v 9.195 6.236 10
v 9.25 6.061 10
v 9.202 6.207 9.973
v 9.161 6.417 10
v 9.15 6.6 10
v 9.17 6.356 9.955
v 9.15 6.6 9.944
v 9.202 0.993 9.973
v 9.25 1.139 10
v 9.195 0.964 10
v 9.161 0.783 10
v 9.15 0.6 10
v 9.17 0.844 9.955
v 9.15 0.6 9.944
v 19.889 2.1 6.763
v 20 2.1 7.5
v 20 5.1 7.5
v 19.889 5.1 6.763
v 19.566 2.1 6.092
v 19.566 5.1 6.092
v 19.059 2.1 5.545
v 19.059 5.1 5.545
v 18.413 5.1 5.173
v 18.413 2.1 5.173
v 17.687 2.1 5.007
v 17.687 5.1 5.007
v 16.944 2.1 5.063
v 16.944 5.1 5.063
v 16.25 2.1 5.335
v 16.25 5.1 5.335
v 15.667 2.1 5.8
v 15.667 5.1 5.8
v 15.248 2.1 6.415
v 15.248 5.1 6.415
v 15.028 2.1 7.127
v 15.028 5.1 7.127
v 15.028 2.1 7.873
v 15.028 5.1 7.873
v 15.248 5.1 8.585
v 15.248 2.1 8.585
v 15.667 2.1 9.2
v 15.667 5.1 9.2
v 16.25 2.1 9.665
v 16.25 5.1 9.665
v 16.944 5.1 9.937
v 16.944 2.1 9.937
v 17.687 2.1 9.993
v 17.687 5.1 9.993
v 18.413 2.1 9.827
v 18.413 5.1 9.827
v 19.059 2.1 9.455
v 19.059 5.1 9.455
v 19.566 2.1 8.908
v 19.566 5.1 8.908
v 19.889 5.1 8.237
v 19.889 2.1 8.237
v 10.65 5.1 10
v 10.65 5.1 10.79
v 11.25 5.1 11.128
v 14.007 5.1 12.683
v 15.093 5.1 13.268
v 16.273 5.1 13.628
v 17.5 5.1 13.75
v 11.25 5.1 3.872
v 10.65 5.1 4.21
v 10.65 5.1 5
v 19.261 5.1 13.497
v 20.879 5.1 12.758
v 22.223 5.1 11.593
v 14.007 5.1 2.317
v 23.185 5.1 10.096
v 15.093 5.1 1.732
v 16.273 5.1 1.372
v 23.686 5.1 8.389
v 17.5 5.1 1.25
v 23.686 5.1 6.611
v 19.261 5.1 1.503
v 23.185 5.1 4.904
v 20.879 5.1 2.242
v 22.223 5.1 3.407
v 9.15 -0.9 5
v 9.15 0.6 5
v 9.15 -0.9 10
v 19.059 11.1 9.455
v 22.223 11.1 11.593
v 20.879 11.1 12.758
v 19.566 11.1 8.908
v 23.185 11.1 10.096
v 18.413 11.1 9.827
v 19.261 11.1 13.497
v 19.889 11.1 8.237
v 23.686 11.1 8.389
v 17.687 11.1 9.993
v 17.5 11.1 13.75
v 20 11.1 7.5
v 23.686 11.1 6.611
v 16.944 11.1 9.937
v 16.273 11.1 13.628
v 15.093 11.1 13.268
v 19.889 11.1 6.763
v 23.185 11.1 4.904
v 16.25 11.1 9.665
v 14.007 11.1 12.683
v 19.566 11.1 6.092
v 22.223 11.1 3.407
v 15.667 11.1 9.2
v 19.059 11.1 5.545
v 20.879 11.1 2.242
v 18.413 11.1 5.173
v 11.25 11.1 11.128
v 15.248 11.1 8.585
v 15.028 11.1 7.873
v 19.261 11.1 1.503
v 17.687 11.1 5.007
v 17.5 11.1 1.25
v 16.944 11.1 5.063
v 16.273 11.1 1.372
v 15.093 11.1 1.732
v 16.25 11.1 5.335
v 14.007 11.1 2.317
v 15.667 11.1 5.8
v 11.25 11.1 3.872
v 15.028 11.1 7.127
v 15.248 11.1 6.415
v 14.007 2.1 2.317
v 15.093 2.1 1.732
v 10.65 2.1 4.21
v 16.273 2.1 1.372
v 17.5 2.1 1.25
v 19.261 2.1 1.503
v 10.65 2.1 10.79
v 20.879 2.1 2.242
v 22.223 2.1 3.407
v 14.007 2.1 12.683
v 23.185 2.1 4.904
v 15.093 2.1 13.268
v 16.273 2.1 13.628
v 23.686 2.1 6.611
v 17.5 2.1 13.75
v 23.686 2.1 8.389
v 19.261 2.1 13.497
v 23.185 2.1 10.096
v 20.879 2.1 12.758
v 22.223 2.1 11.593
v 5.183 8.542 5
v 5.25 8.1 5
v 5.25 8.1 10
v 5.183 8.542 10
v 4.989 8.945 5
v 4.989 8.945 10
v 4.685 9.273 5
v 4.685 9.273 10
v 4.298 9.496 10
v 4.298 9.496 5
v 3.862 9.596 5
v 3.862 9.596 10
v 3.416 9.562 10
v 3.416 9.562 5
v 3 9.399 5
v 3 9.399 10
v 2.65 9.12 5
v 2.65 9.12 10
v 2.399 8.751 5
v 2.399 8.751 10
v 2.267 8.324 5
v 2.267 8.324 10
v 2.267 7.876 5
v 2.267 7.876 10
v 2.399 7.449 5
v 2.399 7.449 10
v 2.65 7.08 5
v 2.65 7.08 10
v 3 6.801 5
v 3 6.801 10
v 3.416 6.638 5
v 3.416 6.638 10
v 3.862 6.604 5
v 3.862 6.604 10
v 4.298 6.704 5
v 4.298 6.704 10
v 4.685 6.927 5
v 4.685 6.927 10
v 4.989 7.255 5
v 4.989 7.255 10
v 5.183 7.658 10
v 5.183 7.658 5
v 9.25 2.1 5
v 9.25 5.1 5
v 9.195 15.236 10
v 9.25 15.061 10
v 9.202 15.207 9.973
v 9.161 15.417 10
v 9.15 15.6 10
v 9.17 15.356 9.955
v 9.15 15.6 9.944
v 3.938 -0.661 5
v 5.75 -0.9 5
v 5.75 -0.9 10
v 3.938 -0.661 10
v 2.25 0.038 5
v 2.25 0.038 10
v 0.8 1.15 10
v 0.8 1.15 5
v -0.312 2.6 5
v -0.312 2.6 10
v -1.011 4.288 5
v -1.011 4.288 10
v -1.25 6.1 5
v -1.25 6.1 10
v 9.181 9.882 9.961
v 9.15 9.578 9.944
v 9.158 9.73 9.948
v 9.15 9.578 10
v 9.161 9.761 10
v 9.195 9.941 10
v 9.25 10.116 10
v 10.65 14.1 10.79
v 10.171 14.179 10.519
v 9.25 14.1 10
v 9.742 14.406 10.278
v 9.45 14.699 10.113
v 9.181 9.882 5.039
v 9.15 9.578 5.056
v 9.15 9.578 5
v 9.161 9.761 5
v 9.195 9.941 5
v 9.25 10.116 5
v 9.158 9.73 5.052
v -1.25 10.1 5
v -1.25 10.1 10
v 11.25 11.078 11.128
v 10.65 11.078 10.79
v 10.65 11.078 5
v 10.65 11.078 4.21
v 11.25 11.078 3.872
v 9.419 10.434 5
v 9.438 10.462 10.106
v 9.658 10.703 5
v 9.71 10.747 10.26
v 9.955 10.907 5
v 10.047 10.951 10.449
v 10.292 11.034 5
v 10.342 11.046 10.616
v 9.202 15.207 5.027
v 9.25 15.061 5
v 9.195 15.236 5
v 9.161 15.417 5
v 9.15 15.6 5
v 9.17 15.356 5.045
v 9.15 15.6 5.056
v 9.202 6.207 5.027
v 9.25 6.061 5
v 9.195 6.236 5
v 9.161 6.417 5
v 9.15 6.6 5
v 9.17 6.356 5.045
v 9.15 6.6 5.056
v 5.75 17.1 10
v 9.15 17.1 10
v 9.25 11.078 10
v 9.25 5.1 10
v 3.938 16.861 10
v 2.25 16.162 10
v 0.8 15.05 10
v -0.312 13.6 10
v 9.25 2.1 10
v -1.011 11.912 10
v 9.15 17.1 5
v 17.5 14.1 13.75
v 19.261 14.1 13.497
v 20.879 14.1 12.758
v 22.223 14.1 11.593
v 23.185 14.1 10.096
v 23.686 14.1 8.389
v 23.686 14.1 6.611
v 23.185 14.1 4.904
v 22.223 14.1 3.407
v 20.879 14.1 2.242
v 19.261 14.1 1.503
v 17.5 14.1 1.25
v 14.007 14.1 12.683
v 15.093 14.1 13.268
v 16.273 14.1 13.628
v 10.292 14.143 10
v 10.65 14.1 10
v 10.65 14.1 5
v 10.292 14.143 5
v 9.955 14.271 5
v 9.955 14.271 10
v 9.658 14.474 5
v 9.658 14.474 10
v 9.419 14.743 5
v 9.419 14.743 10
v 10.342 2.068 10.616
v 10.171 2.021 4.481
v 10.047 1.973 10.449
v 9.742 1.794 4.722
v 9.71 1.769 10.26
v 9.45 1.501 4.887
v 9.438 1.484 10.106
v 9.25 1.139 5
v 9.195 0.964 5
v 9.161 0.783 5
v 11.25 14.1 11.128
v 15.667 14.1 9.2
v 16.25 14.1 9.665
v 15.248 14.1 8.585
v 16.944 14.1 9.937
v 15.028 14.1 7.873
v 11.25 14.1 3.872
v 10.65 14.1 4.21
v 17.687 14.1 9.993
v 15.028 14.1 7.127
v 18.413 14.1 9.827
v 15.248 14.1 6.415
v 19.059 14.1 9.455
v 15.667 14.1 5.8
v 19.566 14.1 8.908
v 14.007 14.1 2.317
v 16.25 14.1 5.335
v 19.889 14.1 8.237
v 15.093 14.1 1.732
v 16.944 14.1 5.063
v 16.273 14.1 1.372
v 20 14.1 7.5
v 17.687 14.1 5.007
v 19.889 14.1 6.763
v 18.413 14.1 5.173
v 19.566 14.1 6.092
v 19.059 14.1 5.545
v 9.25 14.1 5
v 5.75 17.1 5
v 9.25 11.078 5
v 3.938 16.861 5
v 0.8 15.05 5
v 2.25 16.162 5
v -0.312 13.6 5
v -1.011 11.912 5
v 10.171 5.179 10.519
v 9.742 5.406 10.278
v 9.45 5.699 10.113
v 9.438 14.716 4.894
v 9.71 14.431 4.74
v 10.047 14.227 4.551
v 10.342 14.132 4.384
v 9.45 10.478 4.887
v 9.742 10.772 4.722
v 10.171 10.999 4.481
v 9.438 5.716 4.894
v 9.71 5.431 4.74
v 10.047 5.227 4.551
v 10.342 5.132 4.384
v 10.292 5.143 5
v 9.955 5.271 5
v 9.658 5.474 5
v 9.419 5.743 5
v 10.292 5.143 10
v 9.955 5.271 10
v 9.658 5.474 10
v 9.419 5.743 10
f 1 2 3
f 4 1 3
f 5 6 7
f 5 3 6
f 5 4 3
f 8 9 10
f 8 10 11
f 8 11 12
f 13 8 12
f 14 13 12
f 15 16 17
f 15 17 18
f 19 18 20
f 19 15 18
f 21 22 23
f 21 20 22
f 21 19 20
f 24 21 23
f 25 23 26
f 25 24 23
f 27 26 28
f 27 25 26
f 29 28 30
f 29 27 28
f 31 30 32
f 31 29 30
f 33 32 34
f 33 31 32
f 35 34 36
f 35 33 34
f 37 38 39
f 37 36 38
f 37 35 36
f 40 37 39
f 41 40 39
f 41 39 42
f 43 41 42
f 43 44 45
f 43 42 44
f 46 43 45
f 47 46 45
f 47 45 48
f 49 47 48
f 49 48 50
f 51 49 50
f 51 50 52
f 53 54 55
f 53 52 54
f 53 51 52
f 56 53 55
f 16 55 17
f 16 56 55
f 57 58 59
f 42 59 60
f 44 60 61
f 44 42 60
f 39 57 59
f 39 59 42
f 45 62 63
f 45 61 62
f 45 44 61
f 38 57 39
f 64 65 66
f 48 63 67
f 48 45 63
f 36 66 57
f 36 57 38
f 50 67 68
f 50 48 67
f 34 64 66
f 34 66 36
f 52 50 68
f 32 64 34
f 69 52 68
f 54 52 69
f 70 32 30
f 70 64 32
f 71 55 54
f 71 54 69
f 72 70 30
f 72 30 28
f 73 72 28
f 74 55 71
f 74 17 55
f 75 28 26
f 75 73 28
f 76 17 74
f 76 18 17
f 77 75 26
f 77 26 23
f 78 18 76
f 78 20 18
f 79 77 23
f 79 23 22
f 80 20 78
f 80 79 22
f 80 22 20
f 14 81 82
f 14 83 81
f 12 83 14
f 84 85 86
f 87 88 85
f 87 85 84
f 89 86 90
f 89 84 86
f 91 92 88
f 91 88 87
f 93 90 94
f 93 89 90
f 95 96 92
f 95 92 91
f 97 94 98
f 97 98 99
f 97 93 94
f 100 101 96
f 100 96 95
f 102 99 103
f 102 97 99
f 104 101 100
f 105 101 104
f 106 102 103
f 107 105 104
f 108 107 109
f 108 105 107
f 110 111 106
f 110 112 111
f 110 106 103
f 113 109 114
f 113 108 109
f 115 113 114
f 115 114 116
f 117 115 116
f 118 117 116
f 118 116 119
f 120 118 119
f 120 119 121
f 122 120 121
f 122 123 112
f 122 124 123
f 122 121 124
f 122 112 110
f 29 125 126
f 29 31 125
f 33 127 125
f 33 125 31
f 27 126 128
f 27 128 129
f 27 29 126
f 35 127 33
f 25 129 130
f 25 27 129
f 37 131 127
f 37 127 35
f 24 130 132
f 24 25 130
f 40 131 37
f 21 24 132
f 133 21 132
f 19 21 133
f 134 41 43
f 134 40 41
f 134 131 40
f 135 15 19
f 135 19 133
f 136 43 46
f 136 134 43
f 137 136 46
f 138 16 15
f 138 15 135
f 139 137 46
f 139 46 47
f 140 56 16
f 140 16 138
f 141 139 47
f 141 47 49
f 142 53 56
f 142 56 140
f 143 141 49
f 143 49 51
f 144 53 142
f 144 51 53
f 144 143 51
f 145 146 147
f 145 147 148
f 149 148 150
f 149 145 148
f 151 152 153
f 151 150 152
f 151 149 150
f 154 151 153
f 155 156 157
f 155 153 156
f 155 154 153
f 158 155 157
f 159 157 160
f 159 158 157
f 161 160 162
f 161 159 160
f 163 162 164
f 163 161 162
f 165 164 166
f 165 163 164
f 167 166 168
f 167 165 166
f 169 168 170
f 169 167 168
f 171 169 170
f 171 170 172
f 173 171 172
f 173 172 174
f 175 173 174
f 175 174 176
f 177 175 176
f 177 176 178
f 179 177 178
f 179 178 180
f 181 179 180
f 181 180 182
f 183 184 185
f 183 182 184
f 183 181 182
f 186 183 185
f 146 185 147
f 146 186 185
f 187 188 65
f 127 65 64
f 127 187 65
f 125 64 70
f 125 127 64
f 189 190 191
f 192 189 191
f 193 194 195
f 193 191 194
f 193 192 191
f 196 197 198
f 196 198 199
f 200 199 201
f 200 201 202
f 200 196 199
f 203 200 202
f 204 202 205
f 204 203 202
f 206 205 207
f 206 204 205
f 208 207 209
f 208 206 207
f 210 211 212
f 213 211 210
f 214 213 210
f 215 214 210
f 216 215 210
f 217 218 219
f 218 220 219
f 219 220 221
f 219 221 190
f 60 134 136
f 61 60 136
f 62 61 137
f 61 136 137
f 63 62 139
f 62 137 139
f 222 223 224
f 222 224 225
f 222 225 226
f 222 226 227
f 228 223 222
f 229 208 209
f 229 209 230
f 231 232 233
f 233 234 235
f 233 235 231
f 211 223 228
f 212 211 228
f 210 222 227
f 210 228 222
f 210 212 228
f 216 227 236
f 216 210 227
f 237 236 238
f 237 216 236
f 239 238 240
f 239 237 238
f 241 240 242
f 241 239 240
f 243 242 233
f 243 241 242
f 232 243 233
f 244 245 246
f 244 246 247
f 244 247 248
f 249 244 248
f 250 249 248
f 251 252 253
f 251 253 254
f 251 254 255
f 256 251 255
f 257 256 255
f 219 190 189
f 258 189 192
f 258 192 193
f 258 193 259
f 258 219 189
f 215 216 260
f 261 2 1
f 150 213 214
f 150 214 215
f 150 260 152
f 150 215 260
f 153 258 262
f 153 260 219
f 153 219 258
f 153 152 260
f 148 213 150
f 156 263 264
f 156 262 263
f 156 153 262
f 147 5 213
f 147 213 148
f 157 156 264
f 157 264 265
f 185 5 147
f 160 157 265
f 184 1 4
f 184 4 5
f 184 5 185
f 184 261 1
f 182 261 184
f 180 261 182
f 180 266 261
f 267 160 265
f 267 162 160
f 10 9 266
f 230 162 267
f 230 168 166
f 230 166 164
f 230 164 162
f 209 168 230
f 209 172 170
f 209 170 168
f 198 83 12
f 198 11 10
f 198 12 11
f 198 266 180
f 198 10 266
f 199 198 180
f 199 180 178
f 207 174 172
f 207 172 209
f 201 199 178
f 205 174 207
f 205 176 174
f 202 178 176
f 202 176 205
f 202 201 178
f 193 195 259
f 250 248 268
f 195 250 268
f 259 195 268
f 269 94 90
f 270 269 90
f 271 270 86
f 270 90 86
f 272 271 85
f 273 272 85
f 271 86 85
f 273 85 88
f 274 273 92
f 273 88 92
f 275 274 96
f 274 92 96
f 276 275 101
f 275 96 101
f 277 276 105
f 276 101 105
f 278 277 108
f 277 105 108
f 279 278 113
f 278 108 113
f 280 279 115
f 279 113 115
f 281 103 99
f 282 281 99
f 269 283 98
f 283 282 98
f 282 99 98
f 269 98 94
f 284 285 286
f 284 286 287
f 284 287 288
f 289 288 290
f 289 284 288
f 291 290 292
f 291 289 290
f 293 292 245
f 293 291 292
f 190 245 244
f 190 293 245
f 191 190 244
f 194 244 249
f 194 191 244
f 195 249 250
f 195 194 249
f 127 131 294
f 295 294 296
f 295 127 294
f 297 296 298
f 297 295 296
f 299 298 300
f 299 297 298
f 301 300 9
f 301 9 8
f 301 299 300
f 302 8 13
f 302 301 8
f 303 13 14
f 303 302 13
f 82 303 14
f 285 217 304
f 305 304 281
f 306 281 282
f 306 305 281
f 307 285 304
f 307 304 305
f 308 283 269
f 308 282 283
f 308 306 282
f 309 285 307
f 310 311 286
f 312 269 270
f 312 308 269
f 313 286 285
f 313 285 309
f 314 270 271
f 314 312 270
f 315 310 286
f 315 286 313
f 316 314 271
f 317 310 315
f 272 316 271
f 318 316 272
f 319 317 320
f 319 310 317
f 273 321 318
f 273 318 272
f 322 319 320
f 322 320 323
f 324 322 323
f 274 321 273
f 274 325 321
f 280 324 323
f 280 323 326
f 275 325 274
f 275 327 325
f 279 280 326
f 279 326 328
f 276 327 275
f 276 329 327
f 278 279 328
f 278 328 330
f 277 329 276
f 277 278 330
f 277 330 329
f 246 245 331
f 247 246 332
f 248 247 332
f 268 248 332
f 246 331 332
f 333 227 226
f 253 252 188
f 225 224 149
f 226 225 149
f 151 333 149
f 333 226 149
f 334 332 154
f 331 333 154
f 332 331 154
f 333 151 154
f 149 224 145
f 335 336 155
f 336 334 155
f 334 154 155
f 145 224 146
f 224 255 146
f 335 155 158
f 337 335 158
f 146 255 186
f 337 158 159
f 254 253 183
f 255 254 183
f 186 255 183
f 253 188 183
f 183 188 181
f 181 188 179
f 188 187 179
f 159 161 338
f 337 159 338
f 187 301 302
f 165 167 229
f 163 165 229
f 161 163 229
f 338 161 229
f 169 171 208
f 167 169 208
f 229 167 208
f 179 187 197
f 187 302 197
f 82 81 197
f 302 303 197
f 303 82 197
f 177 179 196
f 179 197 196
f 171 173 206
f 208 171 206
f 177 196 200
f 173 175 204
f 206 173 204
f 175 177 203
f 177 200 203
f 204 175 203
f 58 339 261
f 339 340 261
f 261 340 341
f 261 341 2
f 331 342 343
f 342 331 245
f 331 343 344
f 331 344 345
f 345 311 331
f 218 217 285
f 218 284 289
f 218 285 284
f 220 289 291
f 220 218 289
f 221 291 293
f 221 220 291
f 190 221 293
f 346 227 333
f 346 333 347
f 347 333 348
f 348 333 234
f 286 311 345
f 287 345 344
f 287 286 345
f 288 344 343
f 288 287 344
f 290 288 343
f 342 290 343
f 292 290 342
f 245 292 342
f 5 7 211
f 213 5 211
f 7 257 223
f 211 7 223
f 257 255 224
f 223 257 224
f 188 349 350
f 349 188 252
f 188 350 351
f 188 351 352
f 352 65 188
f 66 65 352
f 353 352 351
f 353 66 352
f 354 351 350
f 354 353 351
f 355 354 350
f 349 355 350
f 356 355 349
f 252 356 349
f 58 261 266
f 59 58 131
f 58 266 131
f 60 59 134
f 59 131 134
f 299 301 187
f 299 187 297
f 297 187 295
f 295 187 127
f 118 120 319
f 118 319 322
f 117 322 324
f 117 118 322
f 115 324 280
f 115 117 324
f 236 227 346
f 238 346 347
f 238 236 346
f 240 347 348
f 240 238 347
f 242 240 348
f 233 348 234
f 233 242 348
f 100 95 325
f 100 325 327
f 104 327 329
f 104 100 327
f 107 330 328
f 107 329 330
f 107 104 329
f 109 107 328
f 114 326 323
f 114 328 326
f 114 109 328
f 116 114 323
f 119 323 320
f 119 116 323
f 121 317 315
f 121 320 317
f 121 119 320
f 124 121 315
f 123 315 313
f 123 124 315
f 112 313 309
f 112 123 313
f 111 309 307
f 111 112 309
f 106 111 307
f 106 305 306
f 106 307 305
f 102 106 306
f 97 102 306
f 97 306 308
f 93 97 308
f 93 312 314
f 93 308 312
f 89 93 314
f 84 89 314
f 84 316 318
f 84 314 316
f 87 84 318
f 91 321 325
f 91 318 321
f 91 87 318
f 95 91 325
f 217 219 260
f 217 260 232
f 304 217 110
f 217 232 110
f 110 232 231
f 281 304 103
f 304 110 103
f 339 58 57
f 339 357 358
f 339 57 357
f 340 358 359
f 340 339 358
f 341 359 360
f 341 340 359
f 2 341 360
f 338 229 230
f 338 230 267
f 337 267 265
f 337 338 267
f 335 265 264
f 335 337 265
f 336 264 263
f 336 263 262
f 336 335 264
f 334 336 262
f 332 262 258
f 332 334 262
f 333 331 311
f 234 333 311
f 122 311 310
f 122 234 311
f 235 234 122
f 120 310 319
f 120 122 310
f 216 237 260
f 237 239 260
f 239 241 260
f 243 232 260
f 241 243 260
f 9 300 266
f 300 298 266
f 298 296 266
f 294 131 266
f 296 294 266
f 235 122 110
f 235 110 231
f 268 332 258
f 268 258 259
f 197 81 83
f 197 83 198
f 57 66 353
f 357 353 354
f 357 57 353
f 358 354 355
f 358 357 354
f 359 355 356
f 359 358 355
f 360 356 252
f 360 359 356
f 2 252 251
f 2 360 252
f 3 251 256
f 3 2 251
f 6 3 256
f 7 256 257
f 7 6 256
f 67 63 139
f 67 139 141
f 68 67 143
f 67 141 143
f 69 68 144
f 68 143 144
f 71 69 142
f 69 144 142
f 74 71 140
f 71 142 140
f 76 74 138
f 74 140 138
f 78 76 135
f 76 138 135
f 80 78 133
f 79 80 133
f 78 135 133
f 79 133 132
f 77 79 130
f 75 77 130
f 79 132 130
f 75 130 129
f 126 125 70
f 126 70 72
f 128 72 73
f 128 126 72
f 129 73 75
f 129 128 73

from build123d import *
from build123d.topology import SkipClean

# Parameters (mm, degrees)
CROQUIS1_R              = 1.5
SALIENTE_EXTRUIR1_DEPTH = 15
CROQUIS2_R              = 2.5
CORTAR_EXTRUIR1_DEPTH   = 20
CORTAR_EXTRUIR2_START   = -26
CORTAR_EXTRUIR2_DEPTH   = 26
CROQUIS5_W              = 3.971897385
CROQUIS5_H              = 3.395681121
CROQUIS5_W_2            = 4.283880282
CROQUIS5_H_2            = 5.977747231
CROQUIS5_W_3            = 4.50146752
CROQUIS5_H_3            = 3.991827506
CORTAR_EXTRUIR5_DEPTH   = 10
REDONDEO1_R             = 1.5


with BuildPart() as part:
    # Croquis1 → Saliente-Extruir1 (new body)
    with BuildSketch(Plane.XY):
        with BuildLine():
            Line((11.25, 17.1), (11.25, 14.1))
            Line((11.25, 14.1), (23.75, 14.1))
            Line((23.75, 14.1), (23.75, 11.1))
            Line((23.75, 11.1), (11.25, 11.1))
            Line((11.25, 11.1), (11.25, 5.1))
            Line((11.25, 5.1), (23.75, 5.1))
            Line((23.75, 5.1), (23.75, 2.1))
            Line((23.75, 2.1), (11.25, 2.1))
            Line((11.25, 2.1), (11.25, -0.9))
            Line((11.25, -0.9), (5.75, -0.9))
            ThreePointArc((5.75, -0.9), (0.800252532, 1.150252532), (-1.25, 6.1))
            Line((-1.25, 6.1), (-1.25, 10.1))
            ThreePointArc((-1.25, 10.1), (0.800252532, 15.049747468), (5.75, 17.1))
            Line((5.75, 17.1), (11.25, 17.1))
        make_face()
        with Locations((3.75, 8.1)):
            Circle(CROQUIS1_R, mode=Mode.SUBTRACT)
    extrude(amount=SALIENTE_EXTRUIR1_DEPTH)

    # Croquis2 → Cortar-Extruir1 (cut)
    with BuildSketch(Plane(origin=(0, 0, 0), x_dir=(1, 0, 0), z_dir=(0, 1, 0))):
        with Locations((17.5, -7.5)):
            Circle(CROQUIS2_R)
        with BuildLine():
            Line((17.5, -1.25), (11.25, 0))
            Line((11.25, 0), (11.126279301, 1.868603497))
            Line((11.126279301, 1.868603497), (29.663453957, 1.868603497))
            Line((29.663453957, 1.868603497), (29.663453957, -17.961269996))
            Line((29.663453957, -17.961269996), (11.25, -17.961269996))
            Line((11.25, -17.961269996), (11.25, -15))
            Line((11.25, -15), (17.5, -13.75))
            ThreePointArc((17.5, -13.75), (23.75, -7.5), (17.5, -1.25))
        make_face()
    extrude(amount=CORTAR_EXTRUIR1_DEPTH, mode=Mode.SUBTRACT)

    # Croquis4 → Cortar-Extruir2 (cut)
    with SkipClean():  # the faces are left unmerged after this step: merging them gives an invalid solid
        with BuildSketch(Plane(origin=(0, 17.1, 0), x_dir=(1, 0, 0), z_dir=(0, 1, 0)).offset(CORTAR_EXTRUIR2_START)):
            with BuildLine():
                Line((-4.389645589, -10), (9.25, -10))
                Line((9.25, -10), (14.007302121, -12.683006997))
                ThreePointArc((14.007302121, -12.683006997), (15.673978879, -13.477302641), (17.5, -13.75))
                Line((17.5, -13.75), (17.5, -16.45653889))
                Line((17.5, -16.45653889), (-4.389645589, -16.45653889))
                Line((-4.389645589, -16.45653889), (-4.389645589, -10))
            make_face()
            with BuildLine():
                Line((9.25, -5), (14.007302121, -2.316993003))
                ThreePointArc((14.007302121, -2.316993003), (15.673978879, -1.522697359), (17.5, -1.25))
                Line((17.5, -1.25), (17.5, 1.887707064))
                Line((17.5, 1.887707064), (-4.389645589, 1.887707064))
                Line((-4.389645589, 1.887707064), (-4.389645589, -5))
                Line((-4.389645589, -5), (9.25, -5))
            make_face()
        extrude(amount=CORTAR_EXTRUIR2_DEPTH, mode=Mode.SUBTRACT)

    # Croquis5 → Cortar-Extruir5 (cut, symmetric)
    with SkipClean():  # the faces are left unmerged after this step: merging them gives an invalid solid
        with BuildSketch(Plane.XY.offset(10)):
            with Locations((11.135948693, 15.797840561)):
                Rectangle(CROQUIS5_W, CROQUIS5_H)
            with Locations((11.291940141, 8.088873616)):
                Rectangle(CROQUIS5_W_2, CROQUIS5_H_2)
            with Locations((11.40073376, 0.104086247)):
                Rectangle(CROQUIS5_W_3, CROQUIS5_H_3)
        extrude(amount=CORTAR_EXTRUIR5_DEPTH, both=True, mode=Mode.SUBTRACT)

    # Redondeo1
    # the kernel refuses this fillet: 1.5 mm, written as the material it adds along each edge
    with BuildSketch(Plane(origin=(9.15, 2.1, 1.25), x_dir=(0, -1, 0), z_dir=(0, 0, 1))) as redondeo1_piece_1_section:
        with BuildLine():
            CenterArc((REDONDEO1_R, REDONDEO1_R), REDONDEO1_R, 180, 90)
            Line((0, REDONDEO1_R), (0, 0))
            Line((0, 0), (REDONDEO1_R, 0))
        make_face()
    redondeo1_piece_1 = extrude(amount=8.75, mode=Mode.PRIVATE)
    redondeo1_piece_1 = split(redondeo1_piece_1, bisect_by=Plane(origin=(9.866987005, 1.973706672, 5), z_dir=(0, 0, -1)), keep=Keep.TOP, mode=Mode.PRIVATE)
    redondeo1_piece_1 = split(redondeo1_piece_1, bisect_by=Plane(origin=(9.792542983, 1.973706672, 4.694018462), z_dir=(0.4912379413342998, 0, 0.8710254215541813)), keep=Keep.TOP, mode=Mode.PRIVATE)
    add(redondeo1_piece_1)
    with BuildSketch(Plane(origin=(9.15, 2.1, 5), x_dir=(0, -1, 0), z_dir=(0, 0, 1))) as redondeo1_piece_2_section:
        with BuildLine():
            CenterArc((REDONDEO1_R, REDONDEO1_R), REDONDEO1_R, 180, 90)
            Line((0, REDONDEO1_R), (0, 0))
            Line((0, 0), (REDONDEO1_R, 0))
        make_face()
    redondeo1_piece_2 = extrude(amount=5, mode=Mode.PRIVATE)
    redondeo1_piece_2 = split(redondeo1_piece_2, bisect_by=Plane(origin=(9.170520701, 1.440228568, 5.044824463), z_dir=(-0.4912379413342998, 0, -0.8710254215541813)), keep=Keep.TOP, mode=Mode.PRIVATE)
    add(redondeo1_piece_2)
    with BuildSketch(Plane(origin=(9.15, 2.1, 5), x_dir=(0, -1, 0), z_dir=(0, 0, 1))) as redondeo1_piece_3_section:
        with BuildLine():
            CenterArc((REDONDEO1_R, REDONDEO1_R), REDONDEO1_R, 180, 90)
            Line((0, REDONDEO1_R), (0, 0))
            Line((0, 0), (REDONDEO1_R, 0))
        make_face()
    redondeo1_piece_3 = extrude(amount=5, mode=Mode.PRIVATE)
    redondeo1_piece_3 = split(redondeo1_piece_3, bisect_by=Plane(origin=(8.363208573, 1.761858884, 5.500129599), z_dir=(0.4912379413342998, 0, 0.8710254215541813)), keep=Keep.TOP, mode=Mode.PRIVATE)
    redondeo1_piece_3 = split(redondeo1_piece_3, bisect_by=Plane(origin=(8.363208573, 1.761858884, 9.499870401), z_dir=(0.4912379413342999, 0, -0.8710254215541812)), keep=Keep.TOP, mode=Mode.PRIVATE)
    add(redondeo1_piece_3)
    with BuildSketch(Plane(origin=(9.15, 2.1, 5), x_dir=(0, -1, 0), z_dir=(0, 0, 1))) as redondeo1_piece_4_section:
        with BuildLine():
            CenterArc((REDONDEO1_R, REDONDEO1_R), REDONDEO1_R, 180, 90)
            Line((0, REDONDEO1_R), (0, 0))
            Line((0, 0), (REDONDEO1_R, 0))
        make_face()
    redondeo1_piece_4 = extrude(amount=8.75, mode=Mode.PRIVATE)
    redondeo1_piece_4 = split(redondeo1_piece_4, bisect_by=Plane(origin=(9.866987005, 1.973706672, 10), z_dir=(0, 0, 1)), keep=Keep.TOP, mode=Mode.PRIVATE)
    redondeo1_piece_4 = split(redondeo1_piece_4, bisect_by=Plane(origin=(9.792542983, 1.973706672, 10.305981538), z_dir=(0.4912379413342999, 0, -0.8710254215541812)), keep=Keep.TOP, mode=Mode.PRIVATE)
    add(redondeo1_piece_4)
    with BuildSketch(Plane(origin=(9.15, 2.1, 5), x_dir=(0, -1, 0), z_dir=(0, 0, 1))) as redondeo1_piece_5_section:
        with BuildLine():
            CenterArc((REDONDEO1_R, REDONDEO1_R), REDONDEO1_R, 180, 90)
            Line((0, REDONDEO1_R), (0, 0))
            Line((0, 0), (REDONDEO1_R, 0))
        make_face()
    redondeo1_piece_5 = extrude(amount=5, mode=Mode.PRIVATE)
    redondeo1_piece_5 = split(redondeo1_piece_5, bisect_by=Plane(origin=(9.170520701, 1.440228568, 9.955175537), z_dir=(-0.4912379413342999, 0, 0.8710254215541812)), keep=Keep.TOP, mode=Mode.PRIVATE)
    add(redondeo1_piece_5)
    with BuildSketch(Plane(origin=(9.15, 5.1, 10), x_dir=(1, 0, 0), z_dir=(0, 0, -1))) as redondeo1_piece_6_section:
        with BuildLine():
            CenterArc((REDONDEO1_R, -REDONDEO1_R), REDONDEO1_R, 90, 90)
            Line((0, -REDONDEO1_R), (0, 0))
            Line((0, 0), (REDONDEO1_R, 0))
        make_face()
    redondeo1_piece_6 = extrude(amount=5, mode=Mode.PRIVATE)
    redondeo1_piece_6 = split(redondeo1_piece_6, bisect_by=Plane(origin=(9.170520704, 5.759771469, 9.955175538), z_dir=(-0.4912379413342999, 0, 0.8710254215541812)), keep=Keep.TOP, mode=Mode.PRIVATE)
    add(redondeo1_piece_6)
    with BuildSketch(Plane(origin=(9.15, 5.1, 13.75), x_dir=(1, 0, 0), z_dir=(0, 0, -1))) as redondeo1_piece_7_section:
        with BuildLine():
            CenterArc((REDONDEO1_R, -REDONDEO1_R), REDONDEO1_R, 90, 90)
            Line((0, -REDONDEO1_R), (0, 0))
            Line((0, 0), (REDONDEO1_R, 0))
        make_face()
    redondeo1_piece_7 = extrude(amount=8.75, mode=Mode.PRIVATE)
    redondeo1_piece_7 = split(redondeo1_piece_7, bisect_by=Plane(origin=(9.866987013, 5.226293308, 10), z_dir=(0, 0, 1)), keep=Keep.TOP, mode=Mode.PRIVATE)
    redondeo1_piece_7 = split(redondeo1_piece_7, bisect_by=Plane(origin=(9.792542992, 5.226293308, 10.305981543), z_dir=(0.4912379413342999, 0, -0.8710254215541812)), keep=Keep.TOP, mode=Mode.PRIVATE)
    add(redondeo1_piece_7)
    with BuildSketch(Plane(origin=(9.15, 5.1, 10), x_dir=(1, 0, 0), z_dir=(0, 0, -1))) as redondeo1_piece_8_section:
        with BuildLine():
            CenterArc((REDONDEO1_R, -REDONDEO1_R), REDONDEO1_R, 90, 90)
            Line((0, -REDONDEO1_R), (0, 0))
            Line((0, 0), (REDONDEO1_R, 0))
        make_face()
    redondeo1_piece_8 = extrude(amount=5, mode=Mode.PRIVATE)
    redondeo1_piece_8 = split(redondeo1_piece_8, bisect_by=Plane(origin=(8.363208574, 5.438141117, 5.500129598), z_dir=(0.4912379413342998, 0, 0.8710254215541813)), keep=Keep.TOP, mode=Mode.PRIVATE)
    redondeo1_piece_8 = split(redondeo1_piece_8, bisect_by=Plane(origin=(8.363208574, 5.438141117, 9.499870402), z_dir=(0.4912379413342999, 0, -0.8710254215541812)), keep=Keep.TOP, mode=Mode.PRIVATE)
    add(redondeo1_piece_8)
    with BuildSketch(Plane(origin=(9.15, 5.1, 10), x_dir=(1, 0, 0), z_dir=(0, 0, -1))) as redondeo1_piece_9_section:
        with BuildLine():
            CenterArc((REDONDEO1_R, -REDONDEO1_R), REDONDEO1_R, 90, 90)
            Line((0, -REDONDEO1_R), (0, 0))
            Line((0, 0), (REDONDEO1_R, 0))
        make_face()
    redondeo1_piece_9 = extrude(amount=5, mode=Mode.PRIVATE)
    redondeo1_piece_9 = split(redondeo1_piece_9, bisect_by=Plane(origin=(9.170520704, 5.759771469, 5.044824462), z_dir=(-0.4912379413342998, 0, -0.8710254215541813)), keep=Keep.TOP, mode=Mode.PRIVATE)
    add(redondeo1_piece_9)
    with BuildSketch(Plane(origin=(9.15, 5.1, 10), x_dir=(1, 0, 0), z_dir=(0, 0, -1))) as redondeo1_piece_10_section:
        with BuildLine():
            CenterArc((REDONDEO1_R, -REDONDEO1_R), REDONDEO1_R, 90, 90)
            Line((0, -REDONDEO1_R), (0, 0))
            Line((0, 0), (REDONDEO1_R, 0))
        make_face()
    redondeo1_piece_10 = extrude(amount=8.75, mode=Mode.PRIVATE)
    redondeo1_piece_10 = split(redondeo1_piece_10, bisect_by=Plane(origin=(9.866987013, 5.226293308, 5), z_dir=(0, 0, -1)), keep=Keep.TOP, mode=Mode.PRIVATE)
    redondeo1_piece_10 = split(redondeo1_piece_10, bisect_by=Plane(origin=(9.792542992, 5.226293308, 4.694018457), z_dir=(0.4912379413342998, 0, 0.8710254215541813)), keep=Keep.TOP, mode=Mode.PRIVATE)
    add(redondeo1_piece_10)
    with BuildSketch(Plane(origin=(9.15, 11.077747231, 13.75), x_dir=(0, -1, 0), z_dir=(0, 0, -1))) as redondeo1_piece_11_section:
        with BuildLine():
            CenterArc((REDONDEO1_R, -REDONDEO1_R), REDONDEO1_R, 90, 90)
            Line((0, -REDONDEO1_R), (0, 0))
            Line((0, 0), (REDONDEO1_R, 0))
        make_face()
    redondeo1_piece_11 = extrude(amount=8.75, mode=Mode.PRIVATE)
    redondeo1_piece_11 = split(redondeo1_piece_11, bisect_by=Plane(origin=(9.866987005, 10.951453903, 10), z_dir=(0, 0, 1)), keep=Keep.TOP, mode=Mode.PRIVATE)
    redondeo1_piece_11 = split(redondeo1_piece_11, bisect_by=Plane(origin=(9.792542983, 10.951453903, 10.305981538), z_dir=(0.4912379413342999, 0, -0.8710254215541812)), keep=Keep.TOP, mode=Mode.PRIVATE)
    add(redondeo1_piece_11)
    with BuildSketch(Plane(origin=(9.15, 11.077747231, 10), x_dir=(0, -1, 0), z_dir=(0, 0, -1))) as redondeo1_piece_12_section:
        with BuildLine():
            CenterArc((REDONDEO1_R, -REDONDEO1_R), REDONDEO1_R, 90, 90)
            Line((0, -REDONDEO1_R), (0, 0))
            Line((0, 0), (REDONDEO1_R, 0))
        make_face()
    redondeo1_piece_12 = extrude(amount=5, mode=Mode.PRIVATE)
    redondeo1_piece_12 = split(redondeo1_piece_12, bisect_by=Plane(origin=(9.170520701, 10.417975799, 9.955175537), z_dir=(-0.4912379413342999, 0, 0.8710254215541812)), keep=Keep.TOP, mode=Mode.PRIVATE)
    add(redondeo1_piece_12)
    with BuildSketch(Plane(origin=(9.15, 11.077747231, 10), x_dir=(0, -1, 0), z_dir=(0, 0, -1))) as redondeo1_piece_13_section:
        with BuildLine():
            CenterArc((REDONDEO1_R, -REDONDEO1_R), REDONDEO1_R, 90, 90)
            Line((0, -REDONDEO1_R), (0, 0))
            Line((0, 0), (REDONDEO1_R, 0))
        make_face()
    redondeo1_piece_13 = extrude(amount=5, mode=Mode.PRIVATE)
    redondeo1_piece_13 = split(redondeo1_piece_13, bisect_by=Plane(origin=(8.363208573, 10.739606115, 9.499870401), z_dir=(0.4912379413342999, 0, -0.8710254215541812)), keep=Keep.TOP, mode=Mode.PRIVATE)
    redondeo1_piece_13 = split(redondeo1_piece_13, bisect_by=Plane(origin=(8.363208573, 10.739606115, 5.500129599), z_dir=(0.4912379413342998, 0, 0.8710254215541813)), keep=Keep.TOP, mode=Mode.PRIVATE)
    add(redondeo1_piece_13)
    with BuildSketch(Plane(origin=(9.15, 11.077747231, 10), x_dir=(0, -1, 0), z_dir=(0, 0, -1))) as redondeo1_piece_14_section:
        with BuildLine():
            CenterArc((REDONDEO1_R, -REDONDEO1_R), REDONDEO1_R, 90, 90)
            Line((0, -REDONDEO1_R), (0, 0))
            Line((0, 0), (REDONDEO1_R, 0))
        make_face()
    redondeo1_piece_14 = extrude(amount=8.75, mode=Mode.PRIVATE)
    redondeo1_piece_14 = split(redondeo1_piece_14, bisect_by=Plane(origin=(9.866987005, 10.951453903, 5), z_dir=(0, 0, -1)), keep=Keep.TOP, mode=Mode.PRIVATE)
    redondeo1_piece_14 = split(redondeo1_piece_14, bisect_by=Plane(origin=(9.792542983, 10.951453903, 4.694018462), z_dir=(0.4912379413342998, 0, 0.8710254215541813)), keep=Keep.TOP, mode=Mode.PRIVATE)
    add(redondeo1_piece_14)
    with BuildSketch(Plane(origin=(9.15, 11.077747231, 10), x_dir=(0, -1, 0), z_dir=(0, 0, -1))) as redondeo1_piece_15_section:
        with BuildLine():
            CenterArc((REDONDEO1_R, -REDONDEO1_R), REDONDEO1_R, 90, 90)
            Line((0, -REDONDEO1_R), (0, 0))
            Line((0, 0), (REDONDEO1_R, 0))
        make_face()
    redondeo1_piece_15 = extrude(amount=5, mode=Mode.PRIVATE)
    redondeo1_piece_15 = split(redondeo1_piece_15, bisect_by=Plane(origin=(9.170520701, 10.417975799, 5.044824463), z_dir=(-0.4912379413342998, 0, -0.8710254215541813)), keep=Keep.TOP, mode=Mode.PRIVATE)
    add(redondeo1_piece_15)
    with BuildSketch(Plane(origin=(9.15, 14.1, 10), x_dir=(1, 0, 0), z_dir=(0, 0, -1))) as redondeo1_piece_16_section:
        with BuildLine():
            CenterArc((REDONDEO1_R, -REDONDEO1_R), REDONDEO1_R, 90, 90)
            Line((0, -REDONDEO1_R), (0, 0))
            Line((0, 0), (REDONDEO1_R, 0))
        make_face()
    redondeo1_piece_16 = extrude(amount=5, mode=Mode.PRIVATE)
    redondeo1_piece_16 = split(redondeo1_piece_16, bisect_by=Plane(origin=(9.170520704, 14.759771469, 9.955175538), z_dir=(-0.4912379413342999, 0, 0.8710254215541812)), keep=Keep.TOP, mode=Mode.PRIVATE)
    add(redondeo1_piece_16)
    with BuildSketch(Plane(origin=(9.15, 14.1, 13.75), x_dir=(1, 0, 0), z_dir=(0, 0, -1))) as redondeo1_piece_17_section:
        with BuildLine():
            CenterArc((REDONDEO1_R, -REDONDEO1_R), REDONDEO1_R, 90, 90)
            Line((0, -REDONDEO1_R), (0, 0))
            Line((0, 0), (REDONDEO1_R, 0))
        make_face()
    redondeo1_piece_17 = extrude(amount=8.75, mode=Mode.PRIVATE)
    redondeo1_piece_17 = split(redondeo1_piece_17, bisect_by=Plane(origin=(9.866987013, 14.226293308, 10), z_dir=(0, 0, 1)), keep=Keep.TOP, mode=Mode.PRIVATE)
    redondeo1_piece_17 = split(redondeo1_piece_17, bisect_by=Plane(origin=(9.792542992, 14.226293308, 10.305981543), z_dir=(0.4912379413342999, 0, -0.8710254215541812)), keep=Keep.TOP, mode=Mode.PRIVATE)
    add(redondeo1_piece_17)
    with BuildSketch(Plane(origin=(9.15, 14.1, 10), x_dir=(1, 0, 0), z_dir=(0, 0, -1))) as redondeo1_piece_18_section:
        with BuildLine():
            CenterArc((REDONDEO1_R, -REDONDEO1_R), REDONDEO1_R, 90, 90)
            Line((0, -REDONDEO1_R), (0, 0))
            Line((0, 0), (REDONDEO1_R, 0))
        make_face()
    redondeo1_piece_18 = extrude(amount=5, mode=Mode.PRIVATE)
    redondeo1_piece_18 = split(redondeo1_piece_18, bisect_by=Plane(origin=(8.363208574, 14.438141117, 5.500129598), z_dir=(0.4912379413342998, 0, 0.8710254215541813)), keep=Keep.TOP, mode=Mode.PRIVATE)
    redondeo1_piece_18 = split(redondeo1_piece_18, bisect_by=Plane(origin=(8.363208574, 14.438141117, 9.499870402), z_dir=(0.4912379413342999, 0, -0.8710254215541812)), keep=Keep.TOP, mode=Mode.PRIVATE)
    add(redondeo1_piece_18)
    with BuildSketch(Plane(origin=(9.15, 14.1, 10), x_dir=(1, 0, 0), z_dir=(0, 0, -1))) as redondeo1_piece_19_section:
        with BuildLine():
            CenterArc((REDONDEO1_R, -REDONDEO1_R), REDONDEO1_R, 90, 90)
            Line((0, -REDONDEO1_R), (0, 0))
            Line((0, 0), (REDONDEO1_R, 0))
        make_face()
    redondeo1_piece_19 = extrude(amount=5, mode=Mode.PRIVATE)
    redondeo1_piece_19 = split(redondeo1_piece_19, bisect_by=Plane(origin=(9.170520704, 14.759771469, 5.044824462), z_dir=(-0.4912379413342998, 0, -0.8710254215541813)), keep=Keep.TOP, mode=Mode.PRIVATE)
    add(redondeo1_piece_19)
    with BuildSketch(Plane(origin=(9.15, 14.1, 10), x_dir=(1, 0, 0), z_dir=(0, 0, -1))) as redondeo1_piece_20_section:
        with BuildLine():
            CenterArc((REDONDEO1_R, -REDONDEO1_R), REDONDEO1_R, 90, 90)
            Line((0, -REDONDEO1_R), (0, 0))
            Line((0, 0), (REDONDEO1_R, 0))
        make_face()
    redondeo1_piece_20 = extrude(amount=8.75, mode=Mode.PRIVATE)
    redondeo1_piece_20 = split(redondeo1_piece_20, bisect_by=Plane(origin=(9.866987013, 14.226293308, 5), z_dir=(0, 0, -1)), keep=Keep.TOP, mode=Mode.PRIVATE)
    redondeo1_piece_20 = split(redondeo1_piece_20, bisect_by=Plane(origin=(9.792542992, 14.226293308, 4.694018457), z_dir=(0.4912379413342998, 0, 0.8710254215541813)), keep=Keep.TOP, mode=Mode.PRIVATE)
    add(redondeo1_piece_20)


solid = part.part
